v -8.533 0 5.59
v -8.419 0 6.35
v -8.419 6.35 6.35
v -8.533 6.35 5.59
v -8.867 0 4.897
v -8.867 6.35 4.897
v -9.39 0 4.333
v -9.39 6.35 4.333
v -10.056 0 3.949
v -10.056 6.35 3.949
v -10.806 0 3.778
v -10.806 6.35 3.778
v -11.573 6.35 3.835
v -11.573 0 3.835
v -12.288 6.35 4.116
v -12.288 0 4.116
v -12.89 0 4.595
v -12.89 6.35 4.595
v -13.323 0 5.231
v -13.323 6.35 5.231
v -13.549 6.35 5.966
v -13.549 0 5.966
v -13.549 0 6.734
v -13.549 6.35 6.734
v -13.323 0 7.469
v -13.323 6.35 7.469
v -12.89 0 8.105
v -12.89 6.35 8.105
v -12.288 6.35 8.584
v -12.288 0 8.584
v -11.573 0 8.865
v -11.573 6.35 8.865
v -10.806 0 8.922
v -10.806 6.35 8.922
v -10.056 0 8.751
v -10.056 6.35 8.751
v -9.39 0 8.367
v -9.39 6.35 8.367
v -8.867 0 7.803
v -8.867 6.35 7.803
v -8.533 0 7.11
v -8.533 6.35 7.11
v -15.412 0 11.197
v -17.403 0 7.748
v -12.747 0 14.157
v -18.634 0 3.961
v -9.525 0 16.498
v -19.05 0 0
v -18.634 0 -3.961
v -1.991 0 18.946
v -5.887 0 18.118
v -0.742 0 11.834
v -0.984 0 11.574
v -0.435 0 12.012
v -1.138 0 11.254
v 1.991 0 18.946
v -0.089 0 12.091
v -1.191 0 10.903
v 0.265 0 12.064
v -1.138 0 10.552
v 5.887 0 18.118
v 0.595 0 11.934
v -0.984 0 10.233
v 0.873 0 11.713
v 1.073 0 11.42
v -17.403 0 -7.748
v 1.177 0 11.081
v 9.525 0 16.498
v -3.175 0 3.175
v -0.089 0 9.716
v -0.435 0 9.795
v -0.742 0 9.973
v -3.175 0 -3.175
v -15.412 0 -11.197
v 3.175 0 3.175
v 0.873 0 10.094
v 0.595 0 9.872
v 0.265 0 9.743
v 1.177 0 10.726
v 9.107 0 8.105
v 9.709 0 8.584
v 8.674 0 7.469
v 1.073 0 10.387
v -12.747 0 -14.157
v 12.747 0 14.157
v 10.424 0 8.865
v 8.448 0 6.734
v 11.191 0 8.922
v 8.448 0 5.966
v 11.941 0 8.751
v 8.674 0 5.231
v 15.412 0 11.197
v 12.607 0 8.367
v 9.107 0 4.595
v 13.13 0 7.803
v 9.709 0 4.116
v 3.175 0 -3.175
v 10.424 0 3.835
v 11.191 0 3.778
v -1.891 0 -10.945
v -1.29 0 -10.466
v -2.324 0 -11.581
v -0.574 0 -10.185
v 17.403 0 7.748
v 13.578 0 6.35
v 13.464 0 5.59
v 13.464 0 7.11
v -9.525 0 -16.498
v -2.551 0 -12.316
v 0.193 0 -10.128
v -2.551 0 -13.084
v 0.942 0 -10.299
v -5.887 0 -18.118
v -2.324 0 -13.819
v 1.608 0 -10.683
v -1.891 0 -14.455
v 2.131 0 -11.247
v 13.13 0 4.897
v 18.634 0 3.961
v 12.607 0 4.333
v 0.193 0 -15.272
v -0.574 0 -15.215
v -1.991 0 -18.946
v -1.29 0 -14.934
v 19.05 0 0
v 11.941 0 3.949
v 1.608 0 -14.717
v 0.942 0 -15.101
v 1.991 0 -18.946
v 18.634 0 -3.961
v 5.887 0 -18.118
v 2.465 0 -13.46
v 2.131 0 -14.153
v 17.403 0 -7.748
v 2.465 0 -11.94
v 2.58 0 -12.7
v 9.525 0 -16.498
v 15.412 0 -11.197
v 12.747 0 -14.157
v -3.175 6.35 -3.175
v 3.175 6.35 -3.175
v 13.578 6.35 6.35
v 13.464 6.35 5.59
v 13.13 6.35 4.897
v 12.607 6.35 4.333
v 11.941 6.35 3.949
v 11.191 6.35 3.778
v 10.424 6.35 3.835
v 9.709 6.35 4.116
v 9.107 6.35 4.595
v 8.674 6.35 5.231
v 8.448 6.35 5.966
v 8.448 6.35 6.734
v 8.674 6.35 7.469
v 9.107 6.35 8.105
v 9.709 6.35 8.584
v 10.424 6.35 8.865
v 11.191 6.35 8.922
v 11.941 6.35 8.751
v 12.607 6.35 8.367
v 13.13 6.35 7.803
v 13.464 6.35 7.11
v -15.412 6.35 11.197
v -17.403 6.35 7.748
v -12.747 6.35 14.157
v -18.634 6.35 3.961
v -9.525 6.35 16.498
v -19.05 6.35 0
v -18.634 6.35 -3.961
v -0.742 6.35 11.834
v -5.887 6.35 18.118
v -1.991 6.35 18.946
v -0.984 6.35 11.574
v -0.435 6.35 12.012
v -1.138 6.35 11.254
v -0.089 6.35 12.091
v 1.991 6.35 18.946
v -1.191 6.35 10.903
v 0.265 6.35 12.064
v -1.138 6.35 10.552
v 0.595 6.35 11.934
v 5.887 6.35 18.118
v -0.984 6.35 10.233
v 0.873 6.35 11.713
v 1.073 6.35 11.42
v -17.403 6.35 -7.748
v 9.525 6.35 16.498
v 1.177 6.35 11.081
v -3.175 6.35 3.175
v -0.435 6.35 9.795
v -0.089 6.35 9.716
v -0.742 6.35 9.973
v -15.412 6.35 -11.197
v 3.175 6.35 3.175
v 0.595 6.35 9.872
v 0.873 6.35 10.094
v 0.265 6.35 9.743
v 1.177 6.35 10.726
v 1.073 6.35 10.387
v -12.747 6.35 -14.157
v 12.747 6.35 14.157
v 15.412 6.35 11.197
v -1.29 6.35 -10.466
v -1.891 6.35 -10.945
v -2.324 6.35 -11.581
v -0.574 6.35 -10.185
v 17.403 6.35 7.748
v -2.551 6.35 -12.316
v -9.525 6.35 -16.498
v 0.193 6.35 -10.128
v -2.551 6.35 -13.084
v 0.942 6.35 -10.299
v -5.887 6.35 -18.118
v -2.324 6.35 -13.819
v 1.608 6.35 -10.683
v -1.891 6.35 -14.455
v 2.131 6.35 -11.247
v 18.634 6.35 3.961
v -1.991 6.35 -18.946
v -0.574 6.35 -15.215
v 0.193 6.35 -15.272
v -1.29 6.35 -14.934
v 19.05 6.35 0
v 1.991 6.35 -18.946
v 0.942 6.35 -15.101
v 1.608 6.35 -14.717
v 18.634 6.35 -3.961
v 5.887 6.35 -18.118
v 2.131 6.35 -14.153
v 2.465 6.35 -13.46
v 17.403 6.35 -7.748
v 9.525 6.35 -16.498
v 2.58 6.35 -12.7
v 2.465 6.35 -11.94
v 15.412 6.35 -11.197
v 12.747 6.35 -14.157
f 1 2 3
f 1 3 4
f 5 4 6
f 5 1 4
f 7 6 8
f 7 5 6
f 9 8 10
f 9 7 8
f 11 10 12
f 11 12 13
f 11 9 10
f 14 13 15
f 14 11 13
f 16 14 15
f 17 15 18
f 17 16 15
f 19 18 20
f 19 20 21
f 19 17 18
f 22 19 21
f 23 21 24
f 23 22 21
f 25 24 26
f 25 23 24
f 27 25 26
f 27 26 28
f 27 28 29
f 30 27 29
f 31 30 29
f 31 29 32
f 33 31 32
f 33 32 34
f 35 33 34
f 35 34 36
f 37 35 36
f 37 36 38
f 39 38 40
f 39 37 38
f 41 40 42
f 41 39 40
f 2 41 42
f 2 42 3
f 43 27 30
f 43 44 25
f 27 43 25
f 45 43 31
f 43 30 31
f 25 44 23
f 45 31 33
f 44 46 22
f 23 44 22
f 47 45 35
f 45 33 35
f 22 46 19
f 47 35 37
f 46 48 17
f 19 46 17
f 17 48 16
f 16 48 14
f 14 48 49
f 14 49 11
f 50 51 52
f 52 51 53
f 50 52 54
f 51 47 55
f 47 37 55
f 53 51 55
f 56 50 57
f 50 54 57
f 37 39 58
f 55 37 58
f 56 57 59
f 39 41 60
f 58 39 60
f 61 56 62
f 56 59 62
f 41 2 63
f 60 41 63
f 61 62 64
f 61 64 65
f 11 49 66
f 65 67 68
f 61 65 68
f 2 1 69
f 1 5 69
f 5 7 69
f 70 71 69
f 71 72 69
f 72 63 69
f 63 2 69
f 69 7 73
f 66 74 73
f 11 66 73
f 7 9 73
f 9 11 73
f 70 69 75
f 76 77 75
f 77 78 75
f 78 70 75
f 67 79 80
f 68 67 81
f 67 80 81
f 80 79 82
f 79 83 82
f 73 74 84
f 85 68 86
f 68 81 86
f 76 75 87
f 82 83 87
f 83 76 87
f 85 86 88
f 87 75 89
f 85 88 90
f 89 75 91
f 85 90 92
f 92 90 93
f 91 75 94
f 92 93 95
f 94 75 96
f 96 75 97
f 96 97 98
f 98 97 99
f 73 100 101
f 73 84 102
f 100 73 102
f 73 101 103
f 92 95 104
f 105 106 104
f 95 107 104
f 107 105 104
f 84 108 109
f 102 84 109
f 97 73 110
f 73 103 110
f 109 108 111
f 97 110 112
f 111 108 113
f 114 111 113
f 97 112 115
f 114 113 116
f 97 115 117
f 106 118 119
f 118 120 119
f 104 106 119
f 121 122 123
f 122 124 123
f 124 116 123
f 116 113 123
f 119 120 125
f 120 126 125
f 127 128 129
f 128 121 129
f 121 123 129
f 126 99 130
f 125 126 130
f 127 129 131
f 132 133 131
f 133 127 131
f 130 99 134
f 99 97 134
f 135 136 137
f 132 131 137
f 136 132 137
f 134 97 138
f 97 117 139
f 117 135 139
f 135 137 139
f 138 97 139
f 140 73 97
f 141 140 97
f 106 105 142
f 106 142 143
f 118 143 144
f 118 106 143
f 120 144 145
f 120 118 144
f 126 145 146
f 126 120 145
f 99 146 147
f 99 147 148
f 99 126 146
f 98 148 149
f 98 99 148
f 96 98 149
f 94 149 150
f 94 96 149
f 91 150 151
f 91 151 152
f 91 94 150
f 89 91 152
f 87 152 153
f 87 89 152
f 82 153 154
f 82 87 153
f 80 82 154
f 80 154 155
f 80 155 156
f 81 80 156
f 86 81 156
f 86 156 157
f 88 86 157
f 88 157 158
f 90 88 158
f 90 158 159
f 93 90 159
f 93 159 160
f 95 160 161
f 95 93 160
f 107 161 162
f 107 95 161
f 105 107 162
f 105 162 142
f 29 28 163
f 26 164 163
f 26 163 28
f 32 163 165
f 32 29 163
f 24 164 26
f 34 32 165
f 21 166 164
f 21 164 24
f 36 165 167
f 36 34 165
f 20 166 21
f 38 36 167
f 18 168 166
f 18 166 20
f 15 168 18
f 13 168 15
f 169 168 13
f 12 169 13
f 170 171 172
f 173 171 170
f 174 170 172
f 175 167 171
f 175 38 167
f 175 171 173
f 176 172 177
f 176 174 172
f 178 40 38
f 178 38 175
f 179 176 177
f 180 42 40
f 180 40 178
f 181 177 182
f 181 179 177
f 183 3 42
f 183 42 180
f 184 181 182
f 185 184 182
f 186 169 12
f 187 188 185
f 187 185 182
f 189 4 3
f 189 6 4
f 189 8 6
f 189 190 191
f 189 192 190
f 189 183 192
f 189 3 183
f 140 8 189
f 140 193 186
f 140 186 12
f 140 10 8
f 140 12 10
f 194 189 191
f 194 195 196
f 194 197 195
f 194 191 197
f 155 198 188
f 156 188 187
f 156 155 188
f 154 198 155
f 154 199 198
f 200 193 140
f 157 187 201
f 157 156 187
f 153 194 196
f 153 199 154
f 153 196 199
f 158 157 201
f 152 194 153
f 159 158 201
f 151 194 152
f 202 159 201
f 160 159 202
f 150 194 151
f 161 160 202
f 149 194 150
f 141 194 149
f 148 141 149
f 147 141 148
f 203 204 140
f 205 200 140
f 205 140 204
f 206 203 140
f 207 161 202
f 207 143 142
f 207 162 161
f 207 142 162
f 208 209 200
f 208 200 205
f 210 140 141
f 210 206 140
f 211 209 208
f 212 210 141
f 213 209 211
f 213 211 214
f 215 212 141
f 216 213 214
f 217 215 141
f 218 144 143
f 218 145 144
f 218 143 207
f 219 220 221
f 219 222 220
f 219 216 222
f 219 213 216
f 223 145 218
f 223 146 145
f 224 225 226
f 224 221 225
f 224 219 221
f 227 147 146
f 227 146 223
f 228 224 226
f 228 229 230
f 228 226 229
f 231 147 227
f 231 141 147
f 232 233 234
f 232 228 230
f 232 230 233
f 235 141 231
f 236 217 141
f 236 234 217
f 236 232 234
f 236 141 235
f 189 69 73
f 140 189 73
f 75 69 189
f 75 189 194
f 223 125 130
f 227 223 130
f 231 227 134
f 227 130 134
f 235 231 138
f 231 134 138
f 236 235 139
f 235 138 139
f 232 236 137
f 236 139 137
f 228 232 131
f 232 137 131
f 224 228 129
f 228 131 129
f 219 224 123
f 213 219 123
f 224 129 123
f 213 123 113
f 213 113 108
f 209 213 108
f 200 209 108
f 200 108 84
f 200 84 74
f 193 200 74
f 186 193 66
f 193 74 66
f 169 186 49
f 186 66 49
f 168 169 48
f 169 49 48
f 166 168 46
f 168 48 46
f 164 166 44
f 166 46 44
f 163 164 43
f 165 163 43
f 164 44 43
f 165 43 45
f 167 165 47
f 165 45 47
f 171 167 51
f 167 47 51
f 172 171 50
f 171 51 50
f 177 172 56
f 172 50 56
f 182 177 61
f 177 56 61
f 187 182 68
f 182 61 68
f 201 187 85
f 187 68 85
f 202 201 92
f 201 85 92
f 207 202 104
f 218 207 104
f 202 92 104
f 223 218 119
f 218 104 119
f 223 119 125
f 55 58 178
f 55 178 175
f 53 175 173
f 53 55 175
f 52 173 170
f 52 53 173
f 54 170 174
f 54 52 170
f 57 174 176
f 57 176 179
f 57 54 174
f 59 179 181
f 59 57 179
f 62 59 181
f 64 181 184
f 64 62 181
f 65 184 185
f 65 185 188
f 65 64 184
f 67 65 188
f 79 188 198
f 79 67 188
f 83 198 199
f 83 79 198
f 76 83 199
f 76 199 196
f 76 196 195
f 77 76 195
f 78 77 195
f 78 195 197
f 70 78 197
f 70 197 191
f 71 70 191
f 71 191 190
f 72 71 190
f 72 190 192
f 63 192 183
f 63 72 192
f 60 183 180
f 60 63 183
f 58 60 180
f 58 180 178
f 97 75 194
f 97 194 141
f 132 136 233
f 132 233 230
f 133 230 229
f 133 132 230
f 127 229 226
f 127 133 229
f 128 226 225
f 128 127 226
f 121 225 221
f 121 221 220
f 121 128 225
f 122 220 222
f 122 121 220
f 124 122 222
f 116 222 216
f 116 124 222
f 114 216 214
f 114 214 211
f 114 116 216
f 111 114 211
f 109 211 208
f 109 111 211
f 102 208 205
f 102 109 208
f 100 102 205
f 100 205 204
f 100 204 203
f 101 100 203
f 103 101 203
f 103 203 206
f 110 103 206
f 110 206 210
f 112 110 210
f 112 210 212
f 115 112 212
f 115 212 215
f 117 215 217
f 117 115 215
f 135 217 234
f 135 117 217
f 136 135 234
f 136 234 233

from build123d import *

# Parameters (mm, degrees)
SKETCH1_R           = 19.05
SKETCH1_R_2         = 2.5796875
SKETCH1_W           = 6.35
SKETCH1_H           = 6.35
BOSS_EXTRUDE1_DEPTH = 6.35


with BuildPart() as part:
    # Sketch1 → Boss-Extrude1 (new body)
    with BuildSketch(Plane(origin=(0, 0, 0), x_dir=(1, 0, 0), z_dir=(0, 1, 0))):
        Circle(SKETCH1_R)
        with Locations((0, 12.7)):
            Circle(SKETCH1_R_2, mode=Mode.SUBTRACT)
        with Locations((10.998522628, -6.35)):
            Circle(SKETCH1_R_2, mode=Mode.SUBTRACT)
        with Locations((-10.998522628, -6.35)):
            Circle(SKETCH1_R_2, mode=Mode.SUBTRACT)
        Rectangle(SKETCH1_W, SKETCH1_H, mode=Mode.SUBTRACT)
        with BuildLine():
            ThreePointArc((1.190625, -10.903378281), (0, -9.712753281), (-1.190625, -10.903378281))
            ThreePointArc((-1.190625, -10.903378281), (0, -12.094003281), (1.190625, -10.903378281))
        make_face(mode=Mode.SUBTRACT)
    extrude(amount=BOSS_EXTRUDE1_DEPTH)


solid = part.part
